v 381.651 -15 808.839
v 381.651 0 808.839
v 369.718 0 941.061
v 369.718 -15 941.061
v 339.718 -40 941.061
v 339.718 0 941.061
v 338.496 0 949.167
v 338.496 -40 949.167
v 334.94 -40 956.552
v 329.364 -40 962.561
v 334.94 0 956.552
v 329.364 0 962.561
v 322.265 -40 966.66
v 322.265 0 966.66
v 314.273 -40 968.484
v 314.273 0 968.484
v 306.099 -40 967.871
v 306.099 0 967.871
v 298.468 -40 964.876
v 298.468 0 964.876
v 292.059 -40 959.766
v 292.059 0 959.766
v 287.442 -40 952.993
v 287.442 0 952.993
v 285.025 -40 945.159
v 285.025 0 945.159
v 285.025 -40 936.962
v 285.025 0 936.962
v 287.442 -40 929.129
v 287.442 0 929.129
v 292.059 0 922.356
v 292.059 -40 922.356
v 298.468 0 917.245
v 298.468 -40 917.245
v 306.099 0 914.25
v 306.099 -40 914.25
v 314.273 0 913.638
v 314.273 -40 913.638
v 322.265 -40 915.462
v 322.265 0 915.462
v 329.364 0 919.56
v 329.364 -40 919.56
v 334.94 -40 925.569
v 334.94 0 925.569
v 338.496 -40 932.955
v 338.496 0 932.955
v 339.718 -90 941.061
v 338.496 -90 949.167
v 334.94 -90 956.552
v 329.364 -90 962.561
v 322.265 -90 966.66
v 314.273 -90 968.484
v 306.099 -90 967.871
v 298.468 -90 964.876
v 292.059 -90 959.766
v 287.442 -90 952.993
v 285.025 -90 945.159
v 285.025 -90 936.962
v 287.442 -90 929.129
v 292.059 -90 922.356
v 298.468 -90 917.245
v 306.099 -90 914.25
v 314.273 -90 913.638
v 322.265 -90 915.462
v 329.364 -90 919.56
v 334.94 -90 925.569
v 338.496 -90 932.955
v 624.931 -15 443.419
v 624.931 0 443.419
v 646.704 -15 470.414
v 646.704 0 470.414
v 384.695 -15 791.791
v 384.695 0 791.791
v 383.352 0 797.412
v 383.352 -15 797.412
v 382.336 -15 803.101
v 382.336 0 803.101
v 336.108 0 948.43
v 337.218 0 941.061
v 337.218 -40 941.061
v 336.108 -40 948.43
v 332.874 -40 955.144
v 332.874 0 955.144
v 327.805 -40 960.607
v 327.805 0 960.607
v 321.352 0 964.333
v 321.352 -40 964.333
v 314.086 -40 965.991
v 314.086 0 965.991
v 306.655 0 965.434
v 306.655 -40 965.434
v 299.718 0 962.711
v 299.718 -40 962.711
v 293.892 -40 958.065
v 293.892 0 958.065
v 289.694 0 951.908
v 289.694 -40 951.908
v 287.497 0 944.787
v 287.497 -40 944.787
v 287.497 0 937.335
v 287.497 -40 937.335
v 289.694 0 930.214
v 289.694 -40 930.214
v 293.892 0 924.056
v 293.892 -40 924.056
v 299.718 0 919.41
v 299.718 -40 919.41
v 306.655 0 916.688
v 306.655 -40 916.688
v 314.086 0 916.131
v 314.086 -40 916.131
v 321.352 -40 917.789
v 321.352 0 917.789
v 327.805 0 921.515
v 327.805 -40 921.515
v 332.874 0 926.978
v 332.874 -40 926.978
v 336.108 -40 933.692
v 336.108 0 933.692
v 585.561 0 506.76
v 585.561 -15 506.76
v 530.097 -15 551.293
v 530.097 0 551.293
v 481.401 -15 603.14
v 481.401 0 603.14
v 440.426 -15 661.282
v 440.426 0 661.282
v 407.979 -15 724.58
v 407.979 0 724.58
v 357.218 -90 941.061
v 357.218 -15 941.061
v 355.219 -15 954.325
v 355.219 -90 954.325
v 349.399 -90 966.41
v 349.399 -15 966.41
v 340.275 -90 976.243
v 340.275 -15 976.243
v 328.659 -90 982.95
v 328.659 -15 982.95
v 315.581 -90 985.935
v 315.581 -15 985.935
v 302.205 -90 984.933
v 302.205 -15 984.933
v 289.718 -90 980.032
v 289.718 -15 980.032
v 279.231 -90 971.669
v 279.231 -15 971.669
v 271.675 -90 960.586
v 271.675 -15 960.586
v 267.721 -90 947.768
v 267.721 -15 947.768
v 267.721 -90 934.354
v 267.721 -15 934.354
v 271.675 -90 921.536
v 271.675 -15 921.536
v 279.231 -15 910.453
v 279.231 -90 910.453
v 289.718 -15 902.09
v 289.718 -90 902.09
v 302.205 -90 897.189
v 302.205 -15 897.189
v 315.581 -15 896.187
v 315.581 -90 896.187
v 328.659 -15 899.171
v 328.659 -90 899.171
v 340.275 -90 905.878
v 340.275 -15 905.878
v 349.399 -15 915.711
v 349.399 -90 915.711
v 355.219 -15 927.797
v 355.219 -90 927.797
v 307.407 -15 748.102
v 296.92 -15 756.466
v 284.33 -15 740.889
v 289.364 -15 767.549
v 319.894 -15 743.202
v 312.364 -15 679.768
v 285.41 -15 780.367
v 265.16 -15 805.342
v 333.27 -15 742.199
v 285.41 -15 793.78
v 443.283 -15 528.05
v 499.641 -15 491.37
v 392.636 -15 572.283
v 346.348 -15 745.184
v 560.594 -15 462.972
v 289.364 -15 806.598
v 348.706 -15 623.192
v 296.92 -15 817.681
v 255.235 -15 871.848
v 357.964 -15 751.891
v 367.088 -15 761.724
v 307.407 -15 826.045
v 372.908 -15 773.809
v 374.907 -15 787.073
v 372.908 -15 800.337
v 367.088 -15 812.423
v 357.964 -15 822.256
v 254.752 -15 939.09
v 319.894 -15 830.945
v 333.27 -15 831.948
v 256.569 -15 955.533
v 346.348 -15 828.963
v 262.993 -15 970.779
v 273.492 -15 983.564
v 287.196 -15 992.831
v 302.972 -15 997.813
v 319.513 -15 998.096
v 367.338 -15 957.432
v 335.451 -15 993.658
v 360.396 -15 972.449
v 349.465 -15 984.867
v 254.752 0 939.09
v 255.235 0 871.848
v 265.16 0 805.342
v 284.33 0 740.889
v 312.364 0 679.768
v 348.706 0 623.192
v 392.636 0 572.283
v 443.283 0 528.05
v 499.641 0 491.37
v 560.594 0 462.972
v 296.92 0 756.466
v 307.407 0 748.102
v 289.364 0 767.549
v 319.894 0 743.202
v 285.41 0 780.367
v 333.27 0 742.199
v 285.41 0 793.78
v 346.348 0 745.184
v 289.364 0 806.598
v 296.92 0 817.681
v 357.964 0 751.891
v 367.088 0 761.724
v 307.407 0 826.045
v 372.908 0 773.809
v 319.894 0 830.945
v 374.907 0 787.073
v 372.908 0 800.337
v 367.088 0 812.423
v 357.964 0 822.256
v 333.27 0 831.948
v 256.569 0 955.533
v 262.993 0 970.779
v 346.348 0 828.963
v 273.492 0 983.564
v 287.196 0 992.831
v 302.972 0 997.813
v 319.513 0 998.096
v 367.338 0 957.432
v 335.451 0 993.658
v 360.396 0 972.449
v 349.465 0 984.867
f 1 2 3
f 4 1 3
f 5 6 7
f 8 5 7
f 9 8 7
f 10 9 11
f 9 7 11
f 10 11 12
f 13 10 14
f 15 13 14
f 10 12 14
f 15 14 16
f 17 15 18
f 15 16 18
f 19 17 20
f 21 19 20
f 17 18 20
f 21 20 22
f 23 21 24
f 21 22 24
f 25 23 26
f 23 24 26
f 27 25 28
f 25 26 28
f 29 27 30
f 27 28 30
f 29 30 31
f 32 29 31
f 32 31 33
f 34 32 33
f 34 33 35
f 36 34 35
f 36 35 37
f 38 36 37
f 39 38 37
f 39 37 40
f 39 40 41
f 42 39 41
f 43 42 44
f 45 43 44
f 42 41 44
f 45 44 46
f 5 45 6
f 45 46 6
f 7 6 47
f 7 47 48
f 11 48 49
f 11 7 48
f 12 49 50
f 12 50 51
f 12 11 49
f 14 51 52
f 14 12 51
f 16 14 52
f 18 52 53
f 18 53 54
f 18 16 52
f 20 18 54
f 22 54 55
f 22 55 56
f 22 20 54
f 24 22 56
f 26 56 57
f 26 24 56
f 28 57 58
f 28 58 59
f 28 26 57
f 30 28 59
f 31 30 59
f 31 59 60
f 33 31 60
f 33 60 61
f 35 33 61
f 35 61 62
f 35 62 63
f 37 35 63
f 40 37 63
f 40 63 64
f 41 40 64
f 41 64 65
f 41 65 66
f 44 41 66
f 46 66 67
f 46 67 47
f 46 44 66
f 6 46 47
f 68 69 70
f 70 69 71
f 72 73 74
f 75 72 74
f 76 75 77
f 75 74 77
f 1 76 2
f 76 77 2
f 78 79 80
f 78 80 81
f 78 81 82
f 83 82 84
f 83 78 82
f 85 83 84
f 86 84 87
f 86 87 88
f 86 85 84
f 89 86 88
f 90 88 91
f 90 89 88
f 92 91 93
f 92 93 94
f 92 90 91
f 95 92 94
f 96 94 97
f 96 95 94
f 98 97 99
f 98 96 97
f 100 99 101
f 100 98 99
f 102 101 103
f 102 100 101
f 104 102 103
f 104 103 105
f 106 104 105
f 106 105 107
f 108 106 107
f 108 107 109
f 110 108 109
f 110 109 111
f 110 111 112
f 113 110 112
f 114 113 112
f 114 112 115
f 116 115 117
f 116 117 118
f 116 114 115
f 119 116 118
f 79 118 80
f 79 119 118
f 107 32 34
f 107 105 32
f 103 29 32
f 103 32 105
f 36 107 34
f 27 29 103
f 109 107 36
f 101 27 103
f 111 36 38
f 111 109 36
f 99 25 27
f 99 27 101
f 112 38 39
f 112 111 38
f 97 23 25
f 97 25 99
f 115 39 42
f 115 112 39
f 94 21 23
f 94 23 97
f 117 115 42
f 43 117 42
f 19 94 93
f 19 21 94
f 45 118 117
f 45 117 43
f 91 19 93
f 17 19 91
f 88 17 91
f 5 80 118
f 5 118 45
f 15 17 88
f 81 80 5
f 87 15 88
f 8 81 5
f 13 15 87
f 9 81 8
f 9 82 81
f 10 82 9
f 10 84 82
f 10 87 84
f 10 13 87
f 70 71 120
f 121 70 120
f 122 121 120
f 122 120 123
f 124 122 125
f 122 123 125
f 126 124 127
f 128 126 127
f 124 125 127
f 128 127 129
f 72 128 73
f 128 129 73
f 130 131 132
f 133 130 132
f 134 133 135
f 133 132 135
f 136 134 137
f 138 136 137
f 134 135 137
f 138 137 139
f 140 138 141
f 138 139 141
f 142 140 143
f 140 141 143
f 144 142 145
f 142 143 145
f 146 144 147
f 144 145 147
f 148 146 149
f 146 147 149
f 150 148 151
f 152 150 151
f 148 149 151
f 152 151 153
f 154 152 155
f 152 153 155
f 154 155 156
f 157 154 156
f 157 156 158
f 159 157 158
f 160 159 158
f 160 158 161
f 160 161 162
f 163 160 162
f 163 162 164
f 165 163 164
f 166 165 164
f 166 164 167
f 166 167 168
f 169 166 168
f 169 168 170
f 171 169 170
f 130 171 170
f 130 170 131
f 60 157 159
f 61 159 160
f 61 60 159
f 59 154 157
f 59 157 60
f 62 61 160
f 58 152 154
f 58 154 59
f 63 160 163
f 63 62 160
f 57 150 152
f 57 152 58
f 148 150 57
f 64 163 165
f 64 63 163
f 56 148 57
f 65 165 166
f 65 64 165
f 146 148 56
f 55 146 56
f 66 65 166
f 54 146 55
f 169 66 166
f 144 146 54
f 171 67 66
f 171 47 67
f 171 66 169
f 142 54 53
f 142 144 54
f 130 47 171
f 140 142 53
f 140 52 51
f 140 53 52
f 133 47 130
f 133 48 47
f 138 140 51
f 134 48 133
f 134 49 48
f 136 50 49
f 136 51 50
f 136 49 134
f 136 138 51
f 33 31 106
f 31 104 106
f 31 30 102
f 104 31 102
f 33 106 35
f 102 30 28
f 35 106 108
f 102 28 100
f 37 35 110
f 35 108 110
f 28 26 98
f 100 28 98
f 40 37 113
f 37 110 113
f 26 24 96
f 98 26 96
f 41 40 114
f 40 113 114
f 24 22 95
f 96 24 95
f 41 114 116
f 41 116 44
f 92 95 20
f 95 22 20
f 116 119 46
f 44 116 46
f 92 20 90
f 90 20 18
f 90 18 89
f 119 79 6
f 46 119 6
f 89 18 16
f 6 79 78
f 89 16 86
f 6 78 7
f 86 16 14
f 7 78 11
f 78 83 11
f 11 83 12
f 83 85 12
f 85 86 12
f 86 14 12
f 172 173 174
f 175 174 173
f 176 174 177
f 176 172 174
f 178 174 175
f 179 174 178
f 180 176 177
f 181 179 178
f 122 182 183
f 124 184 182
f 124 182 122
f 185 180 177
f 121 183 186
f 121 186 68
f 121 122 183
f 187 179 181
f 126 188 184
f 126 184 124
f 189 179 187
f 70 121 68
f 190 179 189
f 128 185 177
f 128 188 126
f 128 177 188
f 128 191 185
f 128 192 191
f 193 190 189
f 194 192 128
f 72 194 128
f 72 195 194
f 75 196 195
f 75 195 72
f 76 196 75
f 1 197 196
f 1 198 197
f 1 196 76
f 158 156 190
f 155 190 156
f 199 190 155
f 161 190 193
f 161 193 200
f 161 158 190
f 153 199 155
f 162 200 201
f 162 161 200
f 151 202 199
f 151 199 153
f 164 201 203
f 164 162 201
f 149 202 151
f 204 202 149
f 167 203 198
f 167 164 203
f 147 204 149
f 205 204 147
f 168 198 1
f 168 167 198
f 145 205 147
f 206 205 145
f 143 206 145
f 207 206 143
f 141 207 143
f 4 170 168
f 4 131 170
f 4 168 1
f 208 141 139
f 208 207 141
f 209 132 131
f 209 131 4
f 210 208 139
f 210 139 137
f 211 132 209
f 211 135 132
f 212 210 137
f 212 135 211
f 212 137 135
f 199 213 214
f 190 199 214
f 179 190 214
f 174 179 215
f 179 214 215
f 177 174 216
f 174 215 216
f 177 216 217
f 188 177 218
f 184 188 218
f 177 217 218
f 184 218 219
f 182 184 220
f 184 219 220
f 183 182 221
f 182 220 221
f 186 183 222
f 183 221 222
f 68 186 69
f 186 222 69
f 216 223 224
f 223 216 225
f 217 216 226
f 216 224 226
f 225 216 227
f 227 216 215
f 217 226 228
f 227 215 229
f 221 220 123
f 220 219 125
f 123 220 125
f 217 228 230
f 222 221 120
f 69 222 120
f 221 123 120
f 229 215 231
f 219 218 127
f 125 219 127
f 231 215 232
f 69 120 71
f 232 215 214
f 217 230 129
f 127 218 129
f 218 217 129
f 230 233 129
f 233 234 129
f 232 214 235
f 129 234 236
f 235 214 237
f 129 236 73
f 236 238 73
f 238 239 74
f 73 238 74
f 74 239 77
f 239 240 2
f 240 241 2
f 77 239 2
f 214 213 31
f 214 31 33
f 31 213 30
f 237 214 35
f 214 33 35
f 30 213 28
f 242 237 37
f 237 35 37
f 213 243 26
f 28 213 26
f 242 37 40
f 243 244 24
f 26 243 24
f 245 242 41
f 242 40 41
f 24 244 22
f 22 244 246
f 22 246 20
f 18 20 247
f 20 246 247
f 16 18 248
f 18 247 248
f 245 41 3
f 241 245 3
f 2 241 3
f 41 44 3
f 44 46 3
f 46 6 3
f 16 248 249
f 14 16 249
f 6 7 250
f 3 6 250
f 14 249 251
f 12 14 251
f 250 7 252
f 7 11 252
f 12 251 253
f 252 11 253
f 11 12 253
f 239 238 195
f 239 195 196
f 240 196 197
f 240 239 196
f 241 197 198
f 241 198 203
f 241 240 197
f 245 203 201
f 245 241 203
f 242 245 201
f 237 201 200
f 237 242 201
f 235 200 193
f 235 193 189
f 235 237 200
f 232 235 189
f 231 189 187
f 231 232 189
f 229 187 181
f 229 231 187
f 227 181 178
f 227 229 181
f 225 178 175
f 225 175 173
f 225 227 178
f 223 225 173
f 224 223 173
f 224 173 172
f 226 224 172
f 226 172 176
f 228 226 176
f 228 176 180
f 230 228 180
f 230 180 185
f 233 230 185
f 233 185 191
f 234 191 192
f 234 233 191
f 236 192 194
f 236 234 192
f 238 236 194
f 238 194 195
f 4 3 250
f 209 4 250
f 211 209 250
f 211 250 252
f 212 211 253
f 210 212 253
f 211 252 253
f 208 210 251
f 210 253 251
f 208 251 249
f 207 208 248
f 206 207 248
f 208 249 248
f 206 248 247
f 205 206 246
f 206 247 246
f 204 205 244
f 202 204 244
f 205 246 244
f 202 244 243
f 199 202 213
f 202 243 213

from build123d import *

# Parameters (mm, degrees)
F0_R     = 45
F1_DEPTH = 15
F0_R_2   = 27.5
F0_R_3   = 25
F2_DEPTH = 40
F3_DEPTH = 90


# Not quite as in the source:
# - ends of sketch curves that miss each other by under 0.0002 mm in the source are joined


with BuildPart() as f1:
    # F0 (on Front) → F1 (new body)
    with BuildSketch(Plane.XZ):
        with BuildLine():
            ThreePointArc((384.6949439554, 791.790903988), (382.803167543, 800.2488212516), (381.650846946, 808.8387769951))
            Line((381.650846946, 808.8387769951), (369.718198, 941.060787))
            ThreePointArc((369.718198, 941.060787), (311.2324816498, 998.5523373642), (254.7519940599, 939.0896440021))
            ThreePointArc((254.7519940599, 939.0896440021), (348.7062296758, 623.1920986799), (624.9311859905, 443.4188219584))
            Line((624.9311859905, 443.4188219584), (646.703822, 470.414472))
            ThreePointArc((646.703822, 470.414472), (481.4005278043, 603.1398267524), (384.6949439554, 791.790903988))
        make_face()
        with Locations((329.907435, 787.07348)):
            Circle(F0_R, mode=Mode.SUBTRACT)
        with Locations((312.218198, 941.060787)):
            Circle(F0_R, mode=Mode.SUBTRACT)
    extrude(amount=F1_DEPTH)

    # F0 (on Front) → F3 (join)
    with BuildSketch(Plane.XZ):
        with Locations((312.218198, 941.060787)):
            Circle(F0_R)
        with Locations((312.218198, 941.060787)):
            Circle(F0_R_2, mode=Mode.SUBTRACT)
    extrude(amount=F3_DEPTH)


with BuildPart() as f2:
    # F0 (on Front) → F2 (new body)
    with BuildSketch(Plane.XZ):
        with Locations((312.218198, 941.060787)):
            Circle(F0_R_2)
        with Locations((312.218198, 941.060787)):
            Circle(F0_R_3, mode=Mode.SUBTRACT)
    extrude(amount=F2_DEPTH)


solid = Compound([f1.part, f2.part])
